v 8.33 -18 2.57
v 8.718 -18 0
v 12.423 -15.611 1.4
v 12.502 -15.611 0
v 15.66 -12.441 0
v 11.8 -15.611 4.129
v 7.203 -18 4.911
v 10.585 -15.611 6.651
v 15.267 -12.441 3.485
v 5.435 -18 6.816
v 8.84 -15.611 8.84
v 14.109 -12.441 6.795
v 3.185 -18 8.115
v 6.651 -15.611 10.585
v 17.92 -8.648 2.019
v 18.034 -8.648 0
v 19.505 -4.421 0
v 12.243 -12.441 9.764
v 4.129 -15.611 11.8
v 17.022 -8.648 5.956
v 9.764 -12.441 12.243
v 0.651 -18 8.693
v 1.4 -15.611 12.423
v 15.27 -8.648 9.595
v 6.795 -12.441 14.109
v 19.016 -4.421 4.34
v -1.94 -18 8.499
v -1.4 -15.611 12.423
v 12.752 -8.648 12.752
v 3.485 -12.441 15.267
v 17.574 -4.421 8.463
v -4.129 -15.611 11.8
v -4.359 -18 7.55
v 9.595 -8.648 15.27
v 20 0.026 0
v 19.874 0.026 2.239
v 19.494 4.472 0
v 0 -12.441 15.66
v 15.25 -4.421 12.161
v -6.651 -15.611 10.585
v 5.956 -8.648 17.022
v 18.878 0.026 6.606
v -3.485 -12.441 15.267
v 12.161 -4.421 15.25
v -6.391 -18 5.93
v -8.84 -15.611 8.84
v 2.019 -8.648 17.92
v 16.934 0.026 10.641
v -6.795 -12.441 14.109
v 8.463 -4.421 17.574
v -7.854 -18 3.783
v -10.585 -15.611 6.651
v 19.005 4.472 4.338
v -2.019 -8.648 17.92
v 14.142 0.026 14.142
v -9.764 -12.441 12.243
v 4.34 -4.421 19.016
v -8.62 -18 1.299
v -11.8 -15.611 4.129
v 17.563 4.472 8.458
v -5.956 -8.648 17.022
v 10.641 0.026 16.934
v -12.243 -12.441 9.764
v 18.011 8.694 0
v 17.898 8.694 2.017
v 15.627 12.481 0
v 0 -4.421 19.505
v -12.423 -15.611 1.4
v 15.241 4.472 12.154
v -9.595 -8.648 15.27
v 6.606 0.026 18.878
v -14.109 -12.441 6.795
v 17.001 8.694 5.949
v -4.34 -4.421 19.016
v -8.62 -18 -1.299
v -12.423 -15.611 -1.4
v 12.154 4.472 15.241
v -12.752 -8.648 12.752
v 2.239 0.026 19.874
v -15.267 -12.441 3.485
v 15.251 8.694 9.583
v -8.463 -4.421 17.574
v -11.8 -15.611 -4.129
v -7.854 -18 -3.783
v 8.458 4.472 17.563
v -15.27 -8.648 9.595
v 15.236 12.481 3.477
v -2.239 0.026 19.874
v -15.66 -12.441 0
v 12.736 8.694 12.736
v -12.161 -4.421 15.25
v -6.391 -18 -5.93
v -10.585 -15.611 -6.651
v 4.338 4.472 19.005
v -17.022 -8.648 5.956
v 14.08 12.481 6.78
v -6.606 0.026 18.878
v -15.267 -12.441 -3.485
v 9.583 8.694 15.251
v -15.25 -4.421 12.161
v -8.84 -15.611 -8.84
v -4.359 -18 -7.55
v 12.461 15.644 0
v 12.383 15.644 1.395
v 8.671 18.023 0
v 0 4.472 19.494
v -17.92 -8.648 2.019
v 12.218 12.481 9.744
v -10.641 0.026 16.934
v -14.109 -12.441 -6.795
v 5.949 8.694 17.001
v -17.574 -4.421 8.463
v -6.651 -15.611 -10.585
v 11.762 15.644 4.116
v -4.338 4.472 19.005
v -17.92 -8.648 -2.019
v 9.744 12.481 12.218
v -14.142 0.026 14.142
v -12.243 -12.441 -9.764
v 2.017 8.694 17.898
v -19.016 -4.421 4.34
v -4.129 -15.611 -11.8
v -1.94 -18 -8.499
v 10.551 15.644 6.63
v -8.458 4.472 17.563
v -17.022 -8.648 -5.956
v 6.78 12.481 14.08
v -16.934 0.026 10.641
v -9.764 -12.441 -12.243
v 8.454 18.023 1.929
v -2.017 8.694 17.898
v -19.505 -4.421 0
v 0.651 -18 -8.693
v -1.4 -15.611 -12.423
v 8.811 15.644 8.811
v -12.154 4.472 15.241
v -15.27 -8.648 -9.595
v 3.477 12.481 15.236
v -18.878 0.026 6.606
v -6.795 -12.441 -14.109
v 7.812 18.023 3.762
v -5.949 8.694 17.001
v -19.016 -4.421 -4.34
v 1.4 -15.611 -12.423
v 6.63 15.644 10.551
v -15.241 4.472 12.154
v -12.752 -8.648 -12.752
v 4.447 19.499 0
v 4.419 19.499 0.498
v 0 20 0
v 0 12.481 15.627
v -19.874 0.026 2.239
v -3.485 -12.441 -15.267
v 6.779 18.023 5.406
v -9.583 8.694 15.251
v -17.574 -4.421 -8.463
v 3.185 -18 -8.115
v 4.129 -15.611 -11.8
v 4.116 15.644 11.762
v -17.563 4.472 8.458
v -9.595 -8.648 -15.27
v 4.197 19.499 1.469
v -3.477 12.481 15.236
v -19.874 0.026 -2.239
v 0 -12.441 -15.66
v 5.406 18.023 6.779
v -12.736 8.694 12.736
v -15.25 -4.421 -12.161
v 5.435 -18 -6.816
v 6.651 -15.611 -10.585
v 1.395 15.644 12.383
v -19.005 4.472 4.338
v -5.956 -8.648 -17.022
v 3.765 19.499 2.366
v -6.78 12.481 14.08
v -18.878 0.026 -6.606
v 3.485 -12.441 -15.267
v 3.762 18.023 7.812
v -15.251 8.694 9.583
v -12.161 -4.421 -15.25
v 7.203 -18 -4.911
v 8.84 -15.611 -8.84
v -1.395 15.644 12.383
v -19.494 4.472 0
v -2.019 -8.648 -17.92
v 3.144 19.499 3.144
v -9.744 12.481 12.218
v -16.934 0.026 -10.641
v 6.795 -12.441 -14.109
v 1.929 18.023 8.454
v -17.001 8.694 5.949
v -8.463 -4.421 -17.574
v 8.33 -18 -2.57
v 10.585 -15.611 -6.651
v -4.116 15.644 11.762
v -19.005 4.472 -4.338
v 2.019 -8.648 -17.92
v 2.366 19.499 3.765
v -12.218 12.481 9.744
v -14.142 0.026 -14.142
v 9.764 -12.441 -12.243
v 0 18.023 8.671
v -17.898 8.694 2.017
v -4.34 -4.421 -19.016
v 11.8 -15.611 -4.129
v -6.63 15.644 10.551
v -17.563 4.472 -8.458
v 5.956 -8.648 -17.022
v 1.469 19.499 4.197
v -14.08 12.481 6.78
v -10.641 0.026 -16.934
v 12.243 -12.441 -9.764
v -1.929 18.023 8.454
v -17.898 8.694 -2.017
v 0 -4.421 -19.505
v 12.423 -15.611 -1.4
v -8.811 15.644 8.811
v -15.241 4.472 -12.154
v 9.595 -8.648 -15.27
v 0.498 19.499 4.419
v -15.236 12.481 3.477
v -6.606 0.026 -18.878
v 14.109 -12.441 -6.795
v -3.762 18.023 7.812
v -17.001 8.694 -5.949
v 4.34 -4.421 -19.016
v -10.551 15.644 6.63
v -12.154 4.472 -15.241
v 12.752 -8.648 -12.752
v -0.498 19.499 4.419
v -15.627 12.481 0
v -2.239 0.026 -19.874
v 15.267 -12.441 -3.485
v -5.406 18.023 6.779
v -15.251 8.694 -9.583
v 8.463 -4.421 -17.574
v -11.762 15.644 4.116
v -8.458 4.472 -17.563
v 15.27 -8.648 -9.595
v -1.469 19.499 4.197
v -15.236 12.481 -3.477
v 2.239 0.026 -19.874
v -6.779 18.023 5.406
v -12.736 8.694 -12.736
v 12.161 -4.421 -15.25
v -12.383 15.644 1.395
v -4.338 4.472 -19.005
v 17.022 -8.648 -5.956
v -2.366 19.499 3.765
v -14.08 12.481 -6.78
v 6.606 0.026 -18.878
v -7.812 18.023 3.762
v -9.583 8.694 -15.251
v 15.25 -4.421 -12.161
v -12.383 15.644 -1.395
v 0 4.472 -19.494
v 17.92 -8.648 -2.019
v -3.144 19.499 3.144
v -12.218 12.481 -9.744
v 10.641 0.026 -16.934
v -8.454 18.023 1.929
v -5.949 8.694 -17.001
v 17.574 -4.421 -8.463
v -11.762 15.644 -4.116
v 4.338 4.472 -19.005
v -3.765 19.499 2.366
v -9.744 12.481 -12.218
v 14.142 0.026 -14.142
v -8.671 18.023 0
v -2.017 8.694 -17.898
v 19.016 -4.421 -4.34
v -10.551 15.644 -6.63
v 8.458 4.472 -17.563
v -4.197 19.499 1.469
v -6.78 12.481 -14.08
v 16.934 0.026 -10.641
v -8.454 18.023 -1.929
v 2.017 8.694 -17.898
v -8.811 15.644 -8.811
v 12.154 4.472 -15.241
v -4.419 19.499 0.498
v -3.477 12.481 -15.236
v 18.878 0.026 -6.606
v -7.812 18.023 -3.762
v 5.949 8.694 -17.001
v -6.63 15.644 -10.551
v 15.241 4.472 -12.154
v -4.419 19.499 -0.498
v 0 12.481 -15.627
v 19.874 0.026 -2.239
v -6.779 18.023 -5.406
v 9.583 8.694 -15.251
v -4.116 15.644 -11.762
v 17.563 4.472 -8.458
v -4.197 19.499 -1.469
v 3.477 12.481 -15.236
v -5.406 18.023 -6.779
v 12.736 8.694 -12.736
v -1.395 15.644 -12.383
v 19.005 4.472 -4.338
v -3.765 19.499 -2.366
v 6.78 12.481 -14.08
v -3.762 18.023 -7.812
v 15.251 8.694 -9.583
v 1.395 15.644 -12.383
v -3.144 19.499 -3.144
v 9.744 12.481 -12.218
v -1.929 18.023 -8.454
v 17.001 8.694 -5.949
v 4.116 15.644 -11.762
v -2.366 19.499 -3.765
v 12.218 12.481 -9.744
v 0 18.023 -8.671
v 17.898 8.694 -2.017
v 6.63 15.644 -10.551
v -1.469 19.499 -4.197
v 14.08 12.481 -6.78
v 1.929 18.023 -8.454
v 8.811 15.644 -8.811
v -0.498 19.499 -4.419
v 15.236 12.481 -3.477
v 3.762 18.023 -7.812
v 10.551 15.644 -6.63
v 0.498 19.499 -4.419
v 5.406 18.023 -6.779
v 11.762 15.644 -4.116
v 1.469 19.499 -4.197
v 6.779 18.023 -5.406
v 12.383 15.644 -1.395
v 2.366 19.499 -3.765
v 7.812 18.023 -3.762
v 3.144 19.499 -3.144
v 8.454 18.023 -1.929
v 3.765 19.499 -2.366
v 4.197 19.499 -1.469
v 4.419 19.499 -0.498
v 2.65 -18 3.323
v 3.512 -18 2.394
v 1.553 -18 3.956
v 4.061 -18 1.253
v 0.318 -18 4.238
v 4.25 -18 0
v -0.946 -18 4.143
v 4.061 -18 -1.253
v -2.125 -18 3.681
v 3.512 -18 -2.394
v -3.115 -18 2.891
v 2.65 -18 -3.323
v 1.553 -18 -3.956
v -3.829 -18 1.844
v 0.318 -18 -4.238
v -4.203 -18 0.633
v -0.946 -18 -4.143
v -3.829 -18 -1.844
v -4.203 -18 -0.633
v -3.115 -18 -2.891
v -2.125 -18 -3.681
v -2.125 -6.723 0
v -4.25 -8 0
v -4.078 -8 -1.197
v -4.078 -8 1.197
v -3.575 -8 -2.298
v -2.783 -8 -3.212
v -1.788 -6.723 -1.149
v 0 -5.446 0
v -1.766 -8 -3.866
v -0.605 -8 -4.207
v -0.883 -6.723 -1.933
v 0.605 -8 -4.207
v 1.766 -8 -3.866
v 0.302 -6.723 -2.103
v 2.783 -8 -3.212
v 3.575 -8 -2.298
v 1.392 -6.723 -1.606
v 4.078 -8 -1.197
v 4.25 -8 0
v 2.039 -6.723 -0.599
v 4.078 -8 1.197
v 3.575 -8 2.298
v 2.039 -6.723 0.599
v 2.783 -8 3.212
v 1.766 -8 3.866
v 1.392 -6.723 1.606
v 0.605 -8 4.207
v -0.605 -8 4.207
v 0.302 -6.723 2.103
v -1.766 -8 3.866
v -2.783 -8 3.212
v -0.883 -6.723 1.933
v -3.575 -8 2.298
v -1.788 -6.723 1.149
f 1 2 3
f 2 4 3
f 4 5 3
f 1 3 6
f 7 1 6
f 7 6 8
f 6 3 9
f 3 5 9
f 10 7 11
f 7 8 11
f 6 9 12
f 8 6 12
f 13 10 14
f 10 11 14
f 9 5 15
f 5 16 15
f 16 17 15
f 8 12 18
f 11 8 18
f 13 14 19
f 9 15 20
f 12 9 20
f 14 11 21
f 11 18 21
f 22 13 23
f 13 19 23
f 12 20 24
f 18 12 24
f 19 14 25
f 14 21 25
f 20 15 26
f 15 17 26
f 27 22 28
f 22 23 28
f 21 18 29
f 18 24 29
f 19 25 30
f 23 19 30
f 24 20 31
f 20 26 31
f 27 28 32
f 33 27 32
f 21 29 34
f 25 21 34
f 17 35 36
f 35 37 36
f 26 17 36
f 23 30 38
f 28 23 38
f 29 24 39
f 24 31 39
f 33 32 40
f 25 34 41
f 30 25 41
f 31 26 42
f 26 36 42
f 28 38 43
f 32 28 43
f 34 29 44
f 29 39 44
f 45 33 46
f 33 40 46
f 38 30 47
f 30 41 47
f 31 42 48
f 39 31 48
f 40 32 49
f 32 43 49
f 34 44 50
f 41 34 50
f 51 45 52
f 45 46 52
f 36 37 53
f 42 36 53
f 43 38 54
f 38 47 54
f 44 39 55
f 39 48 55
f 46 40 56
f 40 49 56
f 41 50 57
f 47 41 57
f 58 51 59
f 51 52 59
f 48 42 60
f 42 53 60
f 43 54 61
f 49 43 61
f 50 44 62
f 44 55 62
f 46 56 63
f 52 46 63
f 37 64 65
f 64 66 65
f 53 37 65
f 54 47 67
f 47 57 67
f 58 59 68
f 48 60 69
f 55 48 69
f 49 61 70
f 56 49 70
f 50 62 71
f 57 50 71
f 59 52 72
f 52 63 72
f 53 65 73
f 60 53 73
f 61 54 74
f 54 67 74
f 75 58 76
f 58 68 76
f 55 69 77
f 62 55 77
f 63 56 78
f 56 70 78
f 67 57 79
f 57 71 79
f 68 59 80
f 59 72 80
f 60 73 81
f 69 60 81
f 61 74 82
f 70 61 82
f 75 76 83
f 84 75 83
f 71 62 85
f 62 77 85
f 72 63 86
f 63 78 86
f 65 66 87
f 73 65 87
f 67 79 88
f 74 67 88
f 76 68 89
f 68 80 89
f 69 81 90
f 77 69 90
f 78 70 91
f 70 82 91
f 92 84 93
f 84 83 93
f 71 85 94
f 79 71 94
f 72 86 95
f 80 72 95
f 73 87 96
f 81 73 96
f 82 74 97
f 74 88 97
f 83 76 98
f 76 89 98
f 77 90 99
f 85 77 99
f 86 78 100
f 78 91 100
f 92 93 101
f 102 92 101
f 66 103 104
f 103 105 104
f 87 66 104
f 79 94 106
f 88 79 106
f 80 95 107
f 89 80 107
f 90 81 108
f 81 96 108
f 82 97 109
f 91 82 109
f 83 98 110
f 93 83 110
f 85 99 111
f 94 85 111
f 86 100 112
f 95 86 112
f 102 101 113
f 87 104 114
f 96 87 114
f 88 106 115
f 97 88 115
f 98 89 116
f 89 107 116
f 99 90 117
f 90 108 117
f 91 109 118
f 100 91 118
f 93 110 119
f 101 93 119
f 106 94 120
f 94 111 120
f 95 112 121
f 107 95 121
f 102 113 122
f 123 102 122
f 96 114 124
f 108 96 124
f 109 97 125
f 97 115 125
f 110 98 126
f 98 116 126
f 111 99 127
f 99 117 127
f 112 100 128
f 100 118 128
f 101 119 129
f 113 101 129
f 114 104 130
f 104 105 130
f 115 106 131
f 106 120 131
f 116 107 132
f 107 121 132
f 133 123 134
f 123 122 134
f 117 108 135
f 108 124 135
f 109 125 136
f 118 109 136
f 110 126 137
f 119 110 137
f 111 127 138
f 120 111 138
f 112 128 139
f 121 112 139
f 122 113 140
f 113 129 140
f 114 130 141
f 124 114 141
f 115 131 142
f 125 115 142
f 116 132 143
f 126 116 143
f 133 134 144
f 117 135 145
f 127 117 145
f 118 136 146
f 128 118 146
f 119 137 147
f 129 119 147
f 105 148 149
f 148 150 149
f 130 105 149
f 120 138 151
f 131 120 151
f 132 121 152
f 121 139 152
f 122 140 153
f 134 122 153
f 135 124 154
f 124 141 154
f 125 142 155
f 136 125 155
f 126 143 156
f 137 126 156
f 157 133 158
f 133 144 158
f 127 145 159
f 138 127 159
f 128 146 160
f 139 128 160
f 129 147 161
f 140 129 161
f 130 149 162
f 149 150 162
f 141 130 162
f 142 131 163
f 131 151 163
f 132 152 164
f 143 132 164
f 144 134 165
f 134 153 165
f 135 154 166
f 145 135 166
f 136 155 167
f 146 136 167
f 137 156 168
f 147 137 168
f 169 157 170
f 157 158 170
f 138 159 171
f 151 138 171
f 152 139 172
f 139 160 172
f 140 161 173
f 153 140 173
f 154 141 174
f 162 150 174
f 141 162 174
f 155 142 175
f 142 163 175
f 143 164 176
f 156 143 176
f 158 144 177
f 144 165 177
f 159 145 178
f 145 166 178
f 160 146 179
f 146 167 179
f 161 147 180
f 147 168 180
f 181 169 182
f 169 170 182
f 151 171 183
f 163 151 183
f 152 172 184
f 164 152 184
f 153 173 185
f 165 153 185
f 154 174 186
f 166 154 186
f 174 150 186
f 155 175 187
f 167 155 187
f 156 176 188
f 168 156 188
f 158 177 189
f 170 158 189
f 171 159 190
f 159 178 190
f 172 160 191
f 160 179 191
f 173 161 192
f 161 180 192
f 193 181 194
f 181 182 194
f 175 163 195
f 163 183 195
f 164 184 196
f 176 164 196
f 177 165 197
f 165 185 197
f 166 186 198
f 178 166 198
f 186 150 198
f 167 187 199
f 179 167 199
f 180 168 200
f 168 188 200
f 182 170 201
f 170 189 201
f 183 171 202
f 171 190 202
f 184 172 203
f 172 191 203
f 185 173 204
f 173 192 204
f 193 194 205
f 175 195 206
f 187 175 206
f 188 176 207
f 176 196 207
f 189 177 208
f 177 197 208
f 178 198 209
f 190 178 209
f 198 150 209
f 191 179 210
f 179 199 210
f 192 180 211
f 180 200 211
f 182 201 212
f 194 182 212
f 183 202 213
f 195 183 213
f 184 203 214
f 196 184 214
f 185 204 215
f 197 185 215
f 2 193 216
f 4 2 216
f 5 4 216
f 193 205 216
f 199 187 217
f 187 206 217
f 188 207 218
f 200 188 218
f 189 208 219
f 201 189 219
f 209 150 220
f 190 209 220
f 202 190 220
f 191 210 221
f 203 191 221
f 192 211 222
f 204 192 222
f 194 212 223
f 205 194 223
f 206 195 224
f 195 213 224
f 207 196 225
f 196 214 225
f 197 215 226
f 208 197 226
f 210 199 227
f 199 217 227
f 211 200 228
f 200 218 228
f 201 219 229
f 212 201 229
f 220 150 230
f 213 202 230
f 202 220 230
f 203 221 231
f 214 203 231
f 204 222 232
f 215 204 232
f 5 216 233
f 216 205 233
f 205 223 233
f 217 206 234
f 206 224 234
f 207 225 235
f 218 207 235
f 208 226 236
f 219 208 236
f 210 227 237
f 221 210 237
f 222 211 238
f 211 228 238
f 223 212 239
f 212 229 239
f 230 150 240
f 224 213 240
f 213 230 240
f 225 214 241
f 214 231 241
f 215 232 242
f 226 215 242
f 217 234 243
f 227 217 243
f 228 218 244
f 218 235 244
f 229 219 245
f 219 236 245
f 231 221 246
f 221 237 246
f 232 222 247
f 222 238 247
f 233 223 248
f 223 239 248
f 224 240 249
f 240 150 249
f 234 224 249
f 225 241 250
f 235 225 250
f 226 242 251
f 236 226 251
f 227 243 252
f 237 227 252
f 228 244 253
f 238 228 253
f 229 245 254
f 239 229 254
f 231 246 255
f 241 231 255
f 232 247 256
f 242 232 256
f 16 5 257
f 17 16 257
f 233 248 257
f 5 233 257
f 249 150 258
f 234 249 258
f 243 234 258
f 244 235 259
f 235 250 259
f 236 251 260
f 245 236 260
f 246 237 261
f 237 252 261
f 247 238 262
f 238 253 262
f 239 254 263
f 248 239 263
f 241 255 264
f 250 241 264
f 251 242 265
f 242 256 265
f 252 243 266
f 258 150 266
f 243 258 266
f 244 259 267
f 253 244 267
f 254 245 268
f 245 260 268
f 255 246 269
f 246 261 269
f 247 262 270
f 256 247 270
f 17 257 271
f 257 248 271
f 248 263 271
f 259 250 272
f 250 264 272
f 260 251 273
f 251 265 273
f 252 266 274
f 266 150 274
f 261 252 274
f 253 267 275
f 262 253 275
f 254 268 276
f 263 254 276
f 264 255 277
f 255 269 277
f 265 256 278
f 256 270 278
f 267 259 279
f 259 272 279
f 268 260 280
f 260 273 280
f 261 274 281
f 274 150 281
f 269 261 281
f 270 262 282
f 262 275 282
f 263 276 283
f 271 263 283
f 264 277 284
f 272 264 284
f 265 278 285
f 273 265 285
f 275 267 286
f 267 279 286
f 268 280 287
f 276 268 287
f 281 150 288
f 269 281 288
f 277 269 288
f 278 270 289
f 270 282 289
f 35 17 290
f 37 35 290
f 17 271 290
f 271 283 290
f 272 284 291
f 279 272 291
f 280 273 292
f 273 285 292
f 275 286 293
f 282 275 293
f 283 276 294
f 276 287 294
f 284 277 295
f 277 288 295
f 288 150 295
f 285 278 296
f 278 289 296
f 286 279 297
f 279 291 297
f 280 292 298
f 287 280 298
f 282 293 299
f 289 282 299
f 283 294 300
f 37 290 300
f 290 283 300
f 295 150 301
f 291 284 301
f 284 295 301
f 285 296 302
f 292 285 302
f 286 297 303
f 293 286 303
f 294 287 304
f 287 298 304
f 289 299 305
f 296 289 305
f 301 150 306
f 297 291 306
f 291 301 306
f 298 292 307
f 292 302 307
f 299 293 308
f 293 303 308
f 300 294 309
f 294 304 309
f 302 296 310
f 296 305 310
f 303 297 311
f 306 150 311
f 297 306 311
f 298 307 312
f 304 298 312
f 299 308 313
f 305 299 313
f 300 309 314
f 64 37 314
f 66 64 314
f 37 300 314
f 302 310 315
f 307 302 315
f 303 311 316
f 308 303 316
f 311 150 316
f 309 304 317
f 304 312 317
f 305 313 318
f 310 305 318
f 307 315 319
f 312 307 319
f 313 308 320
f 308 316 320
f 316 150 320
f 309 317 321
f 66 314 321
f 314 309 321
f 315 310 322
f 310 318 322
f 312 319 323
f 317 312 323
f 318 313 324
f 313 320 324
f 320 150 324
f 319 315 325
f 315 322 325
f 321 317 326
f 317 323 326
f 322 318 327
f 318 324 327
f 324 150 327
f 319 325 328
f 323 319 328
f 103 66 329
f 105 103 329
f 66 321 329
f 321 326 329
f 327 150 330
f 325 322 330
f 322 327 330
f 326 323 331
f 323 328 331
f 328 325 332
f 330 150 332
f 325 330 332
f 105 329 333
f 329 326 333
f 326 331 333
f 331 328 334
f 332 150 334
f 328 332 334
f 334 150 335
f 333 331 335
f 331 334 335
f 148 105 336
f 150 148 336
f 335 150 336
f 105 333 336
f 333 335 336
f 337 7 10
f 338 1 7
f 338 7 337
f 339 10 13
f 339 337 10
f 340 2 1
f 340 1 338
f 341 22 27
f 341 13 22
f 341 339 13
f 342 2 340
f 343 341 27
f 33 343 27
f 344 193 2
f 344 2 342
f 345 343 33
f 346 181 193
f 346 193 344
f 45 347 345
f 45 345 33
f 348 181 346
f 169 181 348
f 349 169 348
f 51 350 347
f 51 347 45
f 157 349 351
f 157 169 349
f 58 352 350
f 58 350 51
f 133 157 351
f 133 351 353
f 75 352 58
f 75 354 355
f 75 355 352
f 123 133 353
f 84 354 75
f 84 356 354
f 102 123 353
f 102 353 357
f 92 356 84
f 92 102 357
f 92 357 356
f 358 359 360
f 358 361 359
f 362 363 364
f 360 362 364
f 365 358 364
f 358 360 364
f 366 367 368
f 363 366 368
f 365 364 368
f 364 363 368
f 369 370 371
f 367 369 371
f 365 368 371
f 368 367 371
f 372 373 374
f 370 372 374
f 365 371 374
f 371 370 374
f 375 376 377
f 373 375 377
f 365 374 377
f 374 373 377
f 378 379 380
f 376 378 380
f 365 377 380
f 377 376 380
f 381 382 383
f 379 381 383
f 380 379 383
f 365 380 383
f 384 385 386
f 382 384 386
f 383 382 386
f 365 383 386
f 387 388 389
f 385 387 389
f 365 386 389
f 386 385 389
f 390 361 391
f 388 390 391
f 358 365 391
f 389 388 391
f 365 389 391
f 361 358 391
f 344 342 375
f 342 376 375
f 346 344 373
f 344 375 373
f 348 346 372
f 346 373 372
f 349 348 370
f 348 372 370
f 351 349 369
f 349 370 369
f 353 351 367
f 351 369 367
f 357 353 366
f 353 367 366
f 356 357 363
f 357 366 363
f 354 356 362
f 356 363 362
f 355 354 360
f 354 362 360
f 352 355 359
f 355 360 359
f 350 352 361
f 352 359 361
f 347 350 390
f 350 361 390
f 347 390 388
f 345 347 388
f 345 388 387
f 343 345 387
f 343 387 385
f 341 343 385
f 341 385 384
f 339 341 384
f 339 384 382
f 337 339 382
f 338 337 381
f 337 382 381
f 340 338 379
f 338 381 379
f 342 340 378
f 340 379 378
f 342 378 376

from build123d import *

# Parameters (mm, degrees)
KES_EKSTR_ZYON1_DEPTH      = 35.641016151
KES_EKSTR_ZYON1_DEPTH_BACK = 35.641016151
M10_DI_LI_DELIK1_D         = 8.5
M10_DI_LI_DELIK1_DEPTH     = 10
M10_DI_LI_DELIK1_TIP       = 2.553657631


with BuildPart() as part:
    # Çizim1 → Döndür1 (revolve)
    with BuildSketch(Plane.XY):
        with BuildLine():
            Line((0, 20), (0, -20))
            ThreePointArc((0, -20), (20, 0), (0, 20))
        make_face()
    revolve(axis=Axis((0, 20, 0), (0, -1, 0)))

    # Çizim2 → Kes-Ekstrüzyon1 (cut, two sides: drawn at the far end of the back side and taken through both)
    with BuildSketch(Plane.XY.offset(-KES_EKSTR_ZYON1_DEPTH_BACK)):
        Polygon((-113.979792733, -18), (-8.717797887, -18), (8.717797887, -18), (113.979792733, -18), (113.979792733, -228.523989691), (-113.979792733, -228.523989691), align=None)
    extrude(amount=KES_EKSTR_ZYON1_DEPTH + KES_EKSTR_ZYON1_DEPTH_BACK, mode=Mode.SUBTRACT)

    # M10 Dişli Delik1
    with Locations(Plane(origin=(0, -18, 0), x_dir=(-1, 0, 0), z_dir=(0, -1, 0))):
        with Locations((0, 0)):
            Hole(M10_DI_LI_DELIK1_D / 2, depth=M10_DI_LI_DELIK1_DEPTH)
            with Locations((0, 0, -(M10_DI_LI_DELIK1_DEPTH + M10_DI_LI_DELIK1_TIP / 2))):  # 118° drill point
                Cone(0, M10_DI_LI_DELIK1_D / 2, M10_DI_LI_DELIK1_TIP, mode=Mode.SUBTRACT)


solid = part.part
